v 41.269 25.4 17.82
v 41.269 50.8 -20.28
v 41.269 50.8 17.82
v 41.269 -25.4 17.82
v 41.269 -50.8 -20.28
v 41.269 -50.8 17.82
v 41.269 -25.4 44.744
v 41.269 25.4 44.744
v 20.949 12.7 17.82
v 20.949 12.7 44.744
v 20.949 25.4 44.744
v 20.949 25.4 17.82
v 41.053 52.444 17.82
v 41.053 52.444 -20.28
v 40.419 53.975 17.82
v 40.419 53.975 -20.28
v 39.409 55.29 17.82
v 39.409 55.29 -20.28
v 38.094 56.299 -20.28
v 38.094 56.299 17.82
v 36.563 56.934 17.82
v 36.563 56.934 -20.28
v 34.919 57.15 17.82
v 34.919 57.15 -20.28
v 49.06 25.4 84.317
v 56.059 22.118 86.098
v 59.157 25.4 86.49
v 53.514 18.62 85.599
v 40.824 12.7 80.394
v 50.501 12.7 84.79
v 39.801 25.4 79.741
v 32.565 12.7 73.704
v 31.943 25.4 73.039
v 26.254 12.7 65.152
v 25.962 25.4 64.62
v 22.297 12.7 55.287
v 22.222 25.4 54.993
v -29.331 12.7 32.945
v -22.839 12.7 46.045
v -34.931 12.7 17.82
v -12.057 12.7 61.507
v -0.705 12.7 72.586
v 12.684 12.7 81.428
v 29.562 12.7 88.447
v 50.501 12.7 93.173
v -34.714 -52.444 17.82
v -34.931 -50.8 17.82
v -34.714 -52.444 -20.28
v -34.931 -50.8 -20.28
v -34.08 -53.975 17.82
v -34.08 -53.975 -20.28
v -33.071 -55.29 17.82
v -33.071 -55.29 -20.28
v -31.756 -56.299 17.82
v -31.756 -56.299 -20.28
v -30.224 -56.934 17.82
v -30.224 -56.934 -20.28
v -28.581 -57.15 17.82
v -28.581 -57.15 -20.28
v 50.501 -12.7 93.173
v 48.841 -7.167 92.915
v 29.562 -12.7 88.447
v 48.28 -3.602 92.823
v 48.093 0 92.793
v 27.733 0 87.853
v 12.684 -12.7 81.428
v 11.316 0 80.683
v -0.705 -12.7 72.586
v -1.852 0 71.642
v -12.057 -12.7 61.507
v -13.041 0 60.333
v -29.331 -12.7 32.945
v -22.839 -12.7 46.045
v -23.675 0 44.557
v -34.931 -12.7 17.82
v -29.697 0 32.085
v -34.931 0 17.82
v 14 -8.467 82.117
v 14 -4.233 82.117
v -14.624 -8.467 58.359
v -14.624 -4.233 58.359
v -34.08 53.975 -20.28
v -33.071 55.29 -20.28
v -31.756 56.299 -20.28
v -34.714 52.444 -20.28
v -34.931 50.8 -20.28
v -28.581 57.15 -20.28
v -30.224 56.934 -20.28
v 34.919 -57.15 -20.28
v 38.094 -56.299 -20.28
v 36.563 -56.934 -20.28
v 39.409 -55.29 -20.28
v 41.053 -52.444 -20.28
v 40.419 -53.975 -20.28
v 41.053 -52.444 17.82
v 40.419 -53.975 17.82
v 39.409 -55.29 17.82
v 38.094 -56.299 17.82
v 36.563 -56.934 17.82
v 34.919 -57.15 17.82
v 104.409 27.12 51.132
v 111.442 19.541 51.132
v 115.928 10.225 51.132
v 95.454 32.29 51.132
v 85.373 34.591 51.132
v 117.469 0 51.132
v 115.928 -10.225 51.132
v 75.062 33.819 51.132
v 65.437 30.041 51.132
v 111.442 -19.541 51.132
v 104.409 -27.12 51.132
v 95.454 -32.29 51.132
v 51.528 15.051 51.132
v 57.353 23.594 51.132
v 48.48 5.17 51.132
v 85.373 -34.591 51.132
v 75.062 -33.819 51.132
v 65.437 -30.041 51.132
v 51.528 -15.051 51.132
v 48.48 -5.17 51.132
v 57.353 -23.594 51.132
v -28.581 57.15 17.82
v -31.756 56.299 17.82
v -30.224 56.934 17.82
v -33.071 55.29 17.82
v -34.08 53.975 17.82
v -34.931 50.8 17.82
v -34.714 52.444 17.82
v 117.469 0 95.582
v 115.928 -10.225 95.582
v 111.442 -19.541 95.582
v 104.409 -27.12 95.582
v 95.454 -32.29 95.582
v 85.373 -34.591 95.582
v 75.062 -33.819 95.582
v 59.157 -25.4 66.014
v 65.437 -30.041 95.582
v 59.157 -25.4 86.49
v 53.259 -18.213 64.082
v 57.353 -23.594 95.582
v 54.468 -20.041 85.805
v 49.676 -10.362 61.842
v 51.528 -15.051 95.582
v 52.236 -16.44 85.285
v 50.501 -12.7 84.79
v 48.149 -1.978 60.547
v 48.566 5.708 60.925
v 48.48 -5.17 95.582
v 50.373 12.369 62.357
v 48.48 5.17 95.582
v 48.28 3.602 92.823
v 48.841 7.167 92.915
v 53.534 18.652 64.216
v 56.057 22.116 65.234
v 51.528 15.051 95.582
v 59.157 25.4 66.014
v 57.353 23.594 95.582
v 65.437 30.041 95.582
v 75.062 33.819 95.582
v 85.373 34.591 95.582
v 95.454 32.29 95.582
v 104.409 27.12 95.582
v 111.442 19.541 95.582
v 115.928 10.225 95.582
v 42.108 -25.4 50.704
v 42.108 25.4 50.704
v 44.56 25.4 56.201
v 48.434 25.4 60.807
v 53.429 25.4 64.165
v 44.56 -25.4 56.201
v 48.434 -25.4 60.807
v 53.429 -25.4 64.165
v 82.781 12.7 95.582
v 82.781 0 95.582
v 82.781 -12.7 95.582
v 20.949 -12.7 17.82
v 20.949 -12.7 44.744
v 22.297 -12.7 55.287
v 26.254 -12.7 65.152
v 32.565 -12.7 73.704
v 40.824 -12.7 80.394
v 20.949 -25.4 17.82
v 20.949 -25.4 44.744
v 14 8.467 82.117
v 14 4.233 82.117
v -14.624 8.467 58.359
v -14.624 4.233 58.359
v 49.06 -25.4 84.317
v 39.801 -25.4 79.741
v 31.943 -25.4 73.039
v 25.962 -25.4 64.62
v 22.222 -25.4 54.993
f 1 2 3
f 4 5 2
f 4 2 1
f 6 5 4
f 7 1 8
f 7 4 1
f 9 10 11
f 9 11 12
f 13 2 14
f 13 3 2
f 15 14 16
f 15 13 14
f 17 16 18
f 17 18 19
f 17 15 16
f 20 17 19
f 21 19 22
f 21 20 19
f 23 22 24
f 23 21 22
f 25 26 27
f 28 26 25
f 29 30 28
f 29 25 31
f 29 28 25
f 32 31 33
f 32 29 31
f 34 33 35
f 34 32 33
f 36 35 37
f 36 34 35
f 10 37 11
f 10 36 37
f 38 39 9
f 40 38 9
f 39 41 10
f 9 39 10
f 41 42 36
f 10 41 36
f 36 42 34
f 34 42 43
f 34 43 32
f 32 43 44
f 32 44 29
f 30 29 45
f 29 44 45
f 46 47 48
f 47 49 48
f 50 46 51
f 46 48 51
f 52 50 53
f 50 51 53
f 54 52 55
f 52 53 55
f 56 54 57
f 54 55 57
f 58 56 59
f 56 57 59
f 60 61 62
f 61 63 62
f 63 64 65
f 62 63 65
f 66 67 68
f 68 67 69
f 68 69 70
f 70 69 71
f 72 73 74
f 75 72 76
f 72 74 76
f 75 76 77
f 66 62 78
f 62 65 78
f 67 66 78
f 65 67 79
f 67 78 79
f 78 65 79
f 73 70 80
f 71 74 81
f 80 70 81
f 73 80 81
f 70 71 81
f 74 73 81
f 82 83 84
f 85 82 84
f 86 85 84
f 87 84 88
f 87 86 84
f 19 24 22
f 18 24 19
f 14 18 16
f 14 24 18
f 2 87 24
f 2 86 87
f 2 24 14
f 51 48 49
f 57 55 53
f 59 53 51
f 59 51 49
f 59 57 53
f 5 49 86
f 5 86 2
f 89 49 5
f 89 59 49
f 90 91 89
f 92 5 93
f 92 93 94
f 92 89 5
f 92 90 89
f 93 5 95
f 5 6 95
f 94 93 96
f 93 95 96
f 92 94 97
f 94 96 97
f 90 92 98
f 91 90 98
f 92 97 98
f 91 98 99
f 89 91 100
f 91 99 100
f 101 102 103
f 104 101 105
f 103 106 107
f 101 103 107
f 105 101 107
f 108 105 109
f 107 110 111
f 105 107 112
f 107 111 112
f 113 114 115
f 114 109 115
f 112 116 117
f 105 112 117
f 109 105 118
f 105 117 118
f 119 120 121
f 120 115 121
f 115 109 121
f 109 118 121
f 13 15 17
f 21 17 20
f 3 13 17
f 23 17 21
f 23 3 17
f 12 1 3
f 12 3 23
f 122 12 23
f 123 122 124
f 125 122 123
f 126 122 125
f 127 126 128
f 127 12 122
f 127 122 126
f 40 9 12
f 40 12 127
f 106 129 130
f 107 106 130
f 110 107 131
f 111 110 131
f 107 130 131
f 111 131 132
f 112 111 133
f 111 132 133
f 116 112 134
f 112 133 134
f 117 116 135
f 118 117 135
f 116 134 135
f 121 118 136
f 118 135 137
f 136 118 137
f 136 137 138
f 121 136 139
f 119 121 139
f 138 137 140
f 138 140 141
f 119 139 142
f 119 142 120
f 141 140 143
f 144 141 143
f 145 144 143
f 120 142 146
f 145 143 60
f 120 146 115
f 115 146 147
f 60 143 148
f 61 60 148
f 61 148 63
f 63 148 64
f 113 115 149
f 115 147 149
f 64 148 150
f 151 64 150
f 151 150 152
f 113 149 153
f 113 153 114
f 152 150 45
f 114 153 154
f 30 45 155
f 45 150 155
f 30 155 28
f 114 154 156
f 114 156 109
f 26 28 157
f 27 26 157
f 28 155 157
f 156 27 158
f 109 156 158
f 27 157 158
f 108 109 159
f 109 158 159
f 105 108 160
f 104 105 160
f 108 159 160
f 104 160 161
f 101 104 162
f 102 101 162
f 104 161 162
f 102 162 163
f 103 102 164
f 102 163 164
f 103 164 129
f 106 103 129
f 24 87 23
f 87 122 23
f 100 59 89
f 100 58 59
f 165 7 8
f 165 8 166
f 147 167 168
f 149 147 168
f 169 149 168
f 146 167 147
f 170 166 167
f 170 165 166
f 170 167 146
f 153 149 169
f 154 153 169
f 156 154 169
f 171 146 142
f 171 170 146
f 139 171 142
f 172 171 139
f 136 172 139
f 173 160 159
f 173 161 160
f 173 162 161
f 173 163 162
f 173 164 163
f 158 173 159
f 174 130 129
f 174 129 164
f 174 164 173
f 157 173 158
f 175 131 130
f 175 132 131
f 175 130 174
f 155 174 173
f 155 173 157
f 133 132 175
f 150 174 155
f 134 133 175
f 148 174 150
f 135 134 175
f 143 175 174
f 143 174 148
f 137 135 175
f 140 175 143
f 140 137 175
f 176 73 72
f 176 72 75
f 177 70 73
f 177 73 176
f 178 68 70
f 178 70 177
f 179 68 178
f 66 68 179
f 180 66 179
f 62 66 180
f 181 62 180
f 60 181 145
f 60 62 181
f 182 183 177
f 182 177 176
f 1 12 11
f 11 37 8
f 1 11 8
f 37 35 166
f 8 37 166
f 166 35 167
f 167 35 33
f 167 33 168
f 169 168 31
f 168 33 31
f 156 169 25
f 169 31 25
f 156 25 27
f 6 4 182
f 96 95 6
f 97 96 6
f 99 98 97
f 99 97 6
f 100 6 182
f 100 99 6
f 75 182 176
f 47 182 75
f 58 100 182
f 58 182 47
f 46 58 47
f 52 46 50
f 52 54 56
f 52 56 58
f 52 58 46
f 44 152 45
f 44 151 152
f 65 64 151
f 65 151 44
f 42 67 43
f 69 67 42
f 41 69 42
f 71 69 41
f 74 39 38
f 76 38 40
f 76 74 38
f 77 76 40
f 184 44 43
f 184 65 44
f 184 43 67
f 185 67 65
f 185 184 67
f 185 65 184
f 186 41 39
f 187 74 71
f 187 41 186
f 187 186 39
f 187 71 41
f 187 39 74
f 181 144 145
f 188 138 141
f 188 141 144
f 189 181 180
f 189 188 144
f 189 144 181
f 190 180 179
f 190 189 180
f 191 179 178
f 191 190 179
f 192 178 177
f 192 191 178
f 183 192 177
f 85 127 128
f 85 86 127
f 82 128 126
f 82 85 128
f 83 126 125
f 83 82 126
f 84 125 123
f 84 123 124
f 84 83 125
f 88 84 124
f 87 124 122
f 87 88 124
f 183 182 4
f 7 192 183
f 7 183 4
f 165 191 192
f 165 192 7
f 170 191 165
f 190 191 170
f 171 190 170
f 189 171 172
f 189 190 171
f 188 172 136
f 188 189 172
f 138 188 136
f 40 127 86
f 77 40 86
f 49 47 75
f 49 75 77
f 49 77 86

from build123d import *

# Parameters (mm, degrees)
F1_DEPTH = 57.15
F2_DEPTH = 25.4
F3_DEPTH = 12.7
F0_W     = 34.6883076322
F0_H     = 8.9280228981
F0_H_2   = 20.32
F0_H_3   = 15.2019771019
F5_R     = 6.35


with BuildPart() as f1:
    # F0 (on Front) → F1 (new body, symmetric)
    with BuildSketch(Plane.XZ):
        Polygon((-34.9306485406, 17.8198447397), (-34.9306485406, -20.2801552603), (41.2693514594, -20.2801552603), (41.2693514594, 17.8198447397), (20.9493514594, 17.8198447397), align=None)
    extrude(amount=F1_DEPTH, both=True)

    # F0 (on Front) → F2 (join, symmetric)
    with BuildSketch(Plane.XZ):
        with BuildLine():
            Line((20.9493514594, 17.8198447397), (41.2693514594, 17.8198447397))
            Line((41.2693514594, 17.8198447397), (41.2693514594, 44.7438447397))
            ThreePointArc((41.2693514594, 44.7438447397), (47.5929160536, 60.0102801456), (62.8593514594, 66.3338447397))
            Line((62.8593514594, 66.3338447397), (82.7810438272, 66.3338447397))
            Line((82.7810438272, 66.3338447397), (82.7810438272, 86.6538447397))
            Line((82.7810438272, 86.6538447397), (62.8593514594, 86.6538447397))
            ThreePointArc((62.8593514594, 86.6538447397), (33.2245062599, 74.3786899393), (20.9493514594, 44.7438447397))
            Line((20.9493514594, 44.7438447397), (20.9493514594, 17.8198447397))
        make_face()
    extrude(amount=F2_DEPTH, both=True)

    # F0 (on Front) → F3 (join, symmetric)
    with BuildSketch(Plane.XZ):
        with BuildLine():
            add(Edge.make_bspline(
                [(82.7810438272, 95.5818676378), (25.6006252021, 94.6536809206), (-14.9303628132, 80.6806907058), (-34.9306485406, 17.8198447397)],
                knots=[0, 0, 0, 0, 141.0779030369, 141.0779030369, 141.0779030369, 141.0779030369], degree=3))
            Line((-34.9306485406, 17.8198447397), (20.9493514594, 17.8198447397))
            Line((20.9493514594, 17.8198447397), (20.9493514594, 44.7438447397))
            ThreePointArc((20.9493514594, 44.7438447397), (33.2245062599, 74.3786899393), (62.8593514594, 86.6538447397))
            Line((62.8593514594, 86.6538447397), (82.7810438272, 86.6538447397))
            Line((82.7810438272, 86.6538447397), (82.7810438272, 95.5818676378))
        make_face()
    extrude(amount=F3_DEPTH, both=True)

    # F0 (on Front) → F4 (revolve)
    with BuildSketch(Plane.XZ):
        with Locations((100.1251976433, 91.1178561888)):
            Rectangle(F0_W, F0_H)
        with Locations((100.1251976433, 76.4938447397)):
            Rectangle(F0_W, F0_H_2)
        with Locations((100.1251976433, 58.7328561888)):
            Rectangle(F0_W, F0_H_3)
    revolve(axis=Axis((82.7810438272, 0, 73.3568676378), (0, 0, -1)))

    # F5
    f5_edges = [f1.edges().sort_by_distance(p)[0] for p in [
        (41.269351, 57.15, -1.230155),
        (-34.930649, 57.15, -1.230155),
        (41.269351, -57.15, -1.230155),
        (-34.930649, -57.15, -1.230155),
    ]]
    fillet(f5_edges, radius=F5_R)


solid = f1.part
